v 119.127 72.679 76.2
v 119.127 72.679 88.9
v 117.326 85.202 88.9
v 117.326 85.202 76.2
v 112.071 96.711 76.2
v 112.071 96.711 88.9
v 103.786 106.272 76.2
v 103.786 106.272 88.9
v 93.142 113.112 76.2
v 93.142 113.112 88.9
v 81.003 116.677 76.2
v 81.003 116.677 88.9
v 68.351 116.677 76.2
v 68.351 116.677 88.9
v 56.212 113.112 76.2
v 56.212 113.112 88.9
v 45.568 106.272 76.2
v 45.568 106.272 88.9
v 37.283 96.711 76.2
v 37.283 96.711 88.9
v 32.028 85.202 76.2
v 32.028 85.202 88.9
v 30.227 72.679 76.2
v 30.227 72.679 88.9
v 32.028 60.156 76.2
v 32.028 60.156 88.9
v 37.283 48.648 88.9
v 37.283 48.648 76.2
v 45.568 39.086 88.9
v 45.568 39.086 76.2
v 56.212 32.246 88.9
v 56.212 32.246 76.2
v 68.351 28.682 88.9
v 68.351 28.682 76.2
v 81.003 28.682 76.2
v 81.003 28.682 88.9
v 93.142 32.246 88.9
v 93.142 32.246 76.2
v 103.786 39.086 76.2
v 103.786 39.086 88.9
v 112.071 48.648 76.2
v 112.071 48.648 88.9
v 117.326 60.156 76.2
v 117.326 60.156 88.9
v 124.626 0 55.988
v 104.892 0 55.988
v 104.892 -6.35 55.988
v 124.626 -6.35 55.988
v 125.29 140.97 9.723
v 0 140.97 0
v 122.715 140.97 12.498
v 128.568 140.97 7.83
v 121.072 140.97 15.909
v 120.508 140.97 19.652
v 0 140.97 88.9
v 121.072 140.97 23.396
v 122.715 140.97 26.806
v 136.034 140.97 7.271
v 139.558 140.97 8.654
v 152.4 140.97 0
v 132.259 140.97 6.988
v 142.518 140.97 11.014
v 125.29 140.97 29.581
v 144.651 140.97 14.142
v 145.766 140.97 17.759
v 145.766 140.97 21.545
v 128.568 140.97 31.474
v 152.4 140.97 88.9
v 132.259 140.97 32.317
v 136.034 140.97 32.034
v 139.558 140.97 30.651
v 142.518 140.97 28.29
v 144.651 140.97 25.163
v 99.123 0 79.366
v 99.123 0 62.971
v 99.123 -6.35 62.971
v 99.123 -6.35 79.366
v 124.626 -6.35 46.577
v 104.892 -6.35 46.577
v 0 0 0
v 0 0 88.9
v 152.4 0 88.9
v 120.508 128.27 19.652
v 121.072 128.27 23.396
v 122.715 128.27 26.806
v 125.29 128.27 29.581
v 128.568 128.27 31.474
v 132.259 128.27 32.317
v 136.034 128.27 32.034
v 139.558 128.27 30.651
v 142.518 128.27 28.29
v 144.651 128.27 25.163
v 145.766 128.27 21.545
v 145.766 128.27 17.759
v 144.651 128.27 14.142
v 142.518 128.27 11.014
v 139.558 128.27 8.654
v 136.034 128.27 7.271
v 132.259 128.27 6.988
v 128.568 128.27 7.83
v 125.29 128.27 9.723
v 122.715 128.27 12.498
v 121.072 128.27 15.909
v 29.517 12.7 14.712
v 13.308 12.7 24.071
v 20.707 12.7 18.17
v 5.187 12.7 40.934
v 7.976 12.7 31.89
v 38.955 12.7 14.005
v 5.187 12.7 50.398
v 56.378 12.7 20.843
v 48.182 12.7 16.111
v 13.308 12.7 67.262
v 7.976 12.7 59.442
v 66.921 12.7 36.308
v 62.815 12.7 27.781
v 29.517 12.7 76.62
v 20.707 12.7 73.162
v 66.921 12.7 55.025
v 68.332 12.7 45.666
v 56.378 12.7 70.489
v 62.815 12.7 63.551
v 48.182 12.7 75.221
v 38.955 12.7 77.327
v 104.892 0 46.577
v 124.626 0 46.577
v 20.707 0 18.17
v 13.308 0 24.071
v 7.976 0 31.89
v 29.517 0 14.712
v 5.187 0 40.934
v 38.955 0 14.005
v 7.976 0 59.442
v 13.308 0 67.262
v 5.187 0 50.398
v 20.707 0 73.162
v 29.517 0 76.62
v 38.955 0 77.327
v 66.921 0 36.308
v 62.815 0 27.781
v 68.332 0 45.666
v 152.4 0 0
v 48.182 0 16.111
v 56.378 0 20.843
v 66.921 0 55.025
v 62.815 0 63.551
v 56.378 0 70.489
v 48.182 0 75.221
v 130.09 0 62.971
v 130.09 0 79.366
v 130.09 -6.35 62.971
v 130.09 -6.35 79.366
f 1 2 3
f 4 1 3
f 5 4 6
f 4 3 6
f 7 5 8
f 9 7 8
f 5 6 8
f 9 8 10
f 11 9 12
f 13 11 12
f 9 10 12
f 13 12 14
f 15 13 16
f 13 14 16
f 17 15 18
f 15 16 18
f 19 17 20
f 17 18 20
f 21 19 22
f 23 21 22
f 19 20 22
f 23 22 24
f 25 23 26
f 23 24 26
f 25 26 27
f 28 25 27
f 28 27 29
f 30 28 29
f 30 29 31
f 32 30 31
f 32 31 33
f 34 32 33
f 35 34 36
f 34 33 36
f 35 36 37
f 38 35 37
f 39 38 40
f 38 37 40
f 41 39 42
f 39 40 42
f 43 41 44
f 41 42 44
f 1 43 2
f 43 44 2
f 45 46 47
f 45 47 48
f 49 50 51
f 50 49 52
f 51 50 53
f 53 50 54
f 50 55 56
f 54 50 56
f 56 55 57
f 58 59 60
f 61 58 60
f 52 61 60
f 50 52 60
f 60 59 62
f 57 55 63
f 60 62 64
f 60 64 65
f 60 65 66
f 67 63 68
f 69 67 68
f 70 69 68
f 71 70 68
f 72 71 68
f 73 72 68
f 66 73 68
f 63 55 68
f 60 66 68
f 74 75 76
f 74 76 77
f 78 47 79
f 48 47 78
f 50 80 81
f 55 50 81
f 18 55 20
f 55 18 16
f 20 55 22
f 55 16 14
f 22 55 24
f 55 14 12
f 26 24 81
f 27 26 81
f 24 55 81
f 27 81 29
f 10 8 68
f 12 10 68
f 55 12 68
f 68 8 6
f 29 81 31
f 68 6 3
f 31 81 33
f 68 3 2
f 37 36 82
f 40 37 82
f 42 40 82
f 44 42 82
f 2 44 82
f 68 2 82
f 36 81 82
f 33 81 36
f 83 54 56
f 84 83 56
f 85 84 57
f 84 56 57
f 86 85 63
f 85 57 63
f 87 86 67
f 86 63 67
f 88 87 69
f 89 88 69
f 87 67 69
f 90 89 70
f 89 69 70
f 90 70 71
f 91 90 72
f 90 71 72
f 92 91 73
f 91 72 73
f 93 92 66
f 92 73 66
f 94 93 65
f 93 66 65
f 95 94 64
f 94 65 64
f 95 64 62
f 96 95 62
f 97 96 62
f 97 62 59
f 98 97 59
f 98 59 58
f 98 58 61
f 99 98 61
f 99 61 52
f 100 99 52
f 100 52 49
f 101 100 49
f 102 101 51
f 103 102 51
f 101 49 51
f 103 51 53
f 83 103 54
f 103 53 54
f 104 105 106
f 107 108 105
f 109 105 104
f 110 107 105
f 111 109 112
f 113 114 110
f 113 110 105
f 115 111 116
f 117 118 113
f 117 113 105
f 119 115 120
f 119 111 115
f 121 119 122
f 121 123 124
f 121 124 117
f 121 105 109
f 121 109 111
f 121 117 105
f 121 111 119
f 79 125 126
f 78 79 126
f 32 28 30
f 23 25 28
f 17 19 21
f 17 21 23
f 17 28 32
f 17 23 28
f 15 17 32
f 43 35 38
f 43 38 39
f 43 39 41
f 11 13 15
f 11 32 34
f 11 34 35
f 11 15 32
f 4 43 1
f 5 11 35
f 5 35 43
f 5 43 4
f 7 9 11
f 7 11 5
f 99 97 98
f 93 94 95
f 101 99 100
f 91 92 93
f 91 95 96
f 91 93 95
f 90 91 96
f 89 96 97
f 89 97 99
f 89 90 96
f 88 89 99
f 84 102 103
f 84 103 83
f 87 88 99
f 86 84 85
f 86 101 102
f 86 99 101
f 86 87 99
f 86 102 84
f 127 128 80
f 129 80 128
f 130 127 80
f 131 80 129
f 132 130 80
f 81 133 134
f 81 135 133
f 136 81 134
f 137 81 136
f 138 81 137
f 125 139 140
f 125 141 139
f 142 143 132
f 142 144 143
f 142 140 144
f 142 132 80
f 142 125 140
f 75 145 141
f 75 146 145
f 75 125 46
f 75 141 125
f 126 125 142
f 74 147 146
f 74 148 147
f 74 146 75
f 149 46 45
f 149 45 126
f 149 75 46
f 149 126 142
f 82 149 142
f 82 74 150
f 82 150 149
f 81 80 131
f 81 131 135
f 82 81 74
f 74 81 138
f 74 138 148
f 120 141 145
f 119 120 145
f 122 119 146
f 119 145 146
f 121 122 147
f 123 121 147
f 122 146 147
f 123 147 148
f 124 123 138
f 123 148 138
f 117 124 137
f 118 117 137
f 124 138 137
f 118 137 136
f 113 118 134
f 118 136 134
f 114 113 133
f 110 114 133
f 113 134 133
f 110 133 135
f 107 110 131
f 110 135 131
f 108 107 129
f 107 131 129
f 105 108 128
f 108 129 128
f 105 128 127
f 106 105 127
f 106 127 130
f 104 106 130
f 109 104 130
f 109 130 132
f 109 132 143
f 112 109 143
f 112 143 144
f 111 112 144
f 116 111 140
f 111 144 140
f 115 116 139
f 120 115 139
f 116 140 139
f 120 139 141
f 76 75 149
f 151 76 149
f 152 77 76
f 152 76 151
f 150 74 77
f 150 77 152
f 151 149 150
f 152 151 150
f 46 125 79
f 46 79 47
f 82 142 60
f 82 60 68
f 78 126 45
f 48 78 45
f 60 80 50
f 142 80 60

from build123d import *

# Parameters (mm, degrees)
F0_W     = 152.4
F0_H     = 88.9
F1_DEPTH = 140.97
F2_R     = 12.7
F3_DEPTH = 12.7
F4_R     = 44.45
F5_DEPTH = 12.7
F6_R     = 31.75
F7_DEPTH = 12.7
F6_W     = 30.967094
F6_H     = 16.394339
F6_W_2   = 19.733936
F6_H_2   = 9.411566
F8_DEPTH = 6.35


with BuildPart() as f1:
    # F0 (on Front) → F1 (new body)
    with BuildSketch(Plane.XZ):
        with Locations((76.2, 44.45)):
            Rectangle(F0_W, F0_H)
    extrude(amount=-F1_DEPTH)

    # F2 (on face) → F3 (cut)
    with BuildSketch(Plane(origin=(0, 140.97, 0), x_dir=(-1, 0, 0), z_dir=(0, 1, 0))):
        with Locations((-133.2082, 19.652179)):
            Circle(F2_R)
    extrude(amount=-F3_DEPTH, mode=Mode.SUBTRACT)

    # F4 (on face) → F5 (cut)
    with BuildSketch(Plane.XY.offset(88.9)):
        with Locations((74.677013, 72.679326)):
            Circle(F4_R)
    extrude(amount=-F5_DEPTH, mode=Mode.SUBTRACT)

    # F6 (on face) → F7 (cut)
    with BuildSketch(Plane.XZ):
        with Locations((36.581997, 45.666065)):
            Circle(F6_R)
    extrude(amount=-F7_DEPTH, mode=Mode.SUBTRACT)

    # F6 (on face) → F8 (join)
    with BuildSketch(Plane.XZ):
        with Locations((114.606928, 71.168374)):
            Rectangle(F6_W, F6_H)
        with Locations((114.75873, 51.282644)):
            Rectangle(F6_W_2, F6_H_2)
    extrude(amount=F8_DEPTH)


solid = f1.part
